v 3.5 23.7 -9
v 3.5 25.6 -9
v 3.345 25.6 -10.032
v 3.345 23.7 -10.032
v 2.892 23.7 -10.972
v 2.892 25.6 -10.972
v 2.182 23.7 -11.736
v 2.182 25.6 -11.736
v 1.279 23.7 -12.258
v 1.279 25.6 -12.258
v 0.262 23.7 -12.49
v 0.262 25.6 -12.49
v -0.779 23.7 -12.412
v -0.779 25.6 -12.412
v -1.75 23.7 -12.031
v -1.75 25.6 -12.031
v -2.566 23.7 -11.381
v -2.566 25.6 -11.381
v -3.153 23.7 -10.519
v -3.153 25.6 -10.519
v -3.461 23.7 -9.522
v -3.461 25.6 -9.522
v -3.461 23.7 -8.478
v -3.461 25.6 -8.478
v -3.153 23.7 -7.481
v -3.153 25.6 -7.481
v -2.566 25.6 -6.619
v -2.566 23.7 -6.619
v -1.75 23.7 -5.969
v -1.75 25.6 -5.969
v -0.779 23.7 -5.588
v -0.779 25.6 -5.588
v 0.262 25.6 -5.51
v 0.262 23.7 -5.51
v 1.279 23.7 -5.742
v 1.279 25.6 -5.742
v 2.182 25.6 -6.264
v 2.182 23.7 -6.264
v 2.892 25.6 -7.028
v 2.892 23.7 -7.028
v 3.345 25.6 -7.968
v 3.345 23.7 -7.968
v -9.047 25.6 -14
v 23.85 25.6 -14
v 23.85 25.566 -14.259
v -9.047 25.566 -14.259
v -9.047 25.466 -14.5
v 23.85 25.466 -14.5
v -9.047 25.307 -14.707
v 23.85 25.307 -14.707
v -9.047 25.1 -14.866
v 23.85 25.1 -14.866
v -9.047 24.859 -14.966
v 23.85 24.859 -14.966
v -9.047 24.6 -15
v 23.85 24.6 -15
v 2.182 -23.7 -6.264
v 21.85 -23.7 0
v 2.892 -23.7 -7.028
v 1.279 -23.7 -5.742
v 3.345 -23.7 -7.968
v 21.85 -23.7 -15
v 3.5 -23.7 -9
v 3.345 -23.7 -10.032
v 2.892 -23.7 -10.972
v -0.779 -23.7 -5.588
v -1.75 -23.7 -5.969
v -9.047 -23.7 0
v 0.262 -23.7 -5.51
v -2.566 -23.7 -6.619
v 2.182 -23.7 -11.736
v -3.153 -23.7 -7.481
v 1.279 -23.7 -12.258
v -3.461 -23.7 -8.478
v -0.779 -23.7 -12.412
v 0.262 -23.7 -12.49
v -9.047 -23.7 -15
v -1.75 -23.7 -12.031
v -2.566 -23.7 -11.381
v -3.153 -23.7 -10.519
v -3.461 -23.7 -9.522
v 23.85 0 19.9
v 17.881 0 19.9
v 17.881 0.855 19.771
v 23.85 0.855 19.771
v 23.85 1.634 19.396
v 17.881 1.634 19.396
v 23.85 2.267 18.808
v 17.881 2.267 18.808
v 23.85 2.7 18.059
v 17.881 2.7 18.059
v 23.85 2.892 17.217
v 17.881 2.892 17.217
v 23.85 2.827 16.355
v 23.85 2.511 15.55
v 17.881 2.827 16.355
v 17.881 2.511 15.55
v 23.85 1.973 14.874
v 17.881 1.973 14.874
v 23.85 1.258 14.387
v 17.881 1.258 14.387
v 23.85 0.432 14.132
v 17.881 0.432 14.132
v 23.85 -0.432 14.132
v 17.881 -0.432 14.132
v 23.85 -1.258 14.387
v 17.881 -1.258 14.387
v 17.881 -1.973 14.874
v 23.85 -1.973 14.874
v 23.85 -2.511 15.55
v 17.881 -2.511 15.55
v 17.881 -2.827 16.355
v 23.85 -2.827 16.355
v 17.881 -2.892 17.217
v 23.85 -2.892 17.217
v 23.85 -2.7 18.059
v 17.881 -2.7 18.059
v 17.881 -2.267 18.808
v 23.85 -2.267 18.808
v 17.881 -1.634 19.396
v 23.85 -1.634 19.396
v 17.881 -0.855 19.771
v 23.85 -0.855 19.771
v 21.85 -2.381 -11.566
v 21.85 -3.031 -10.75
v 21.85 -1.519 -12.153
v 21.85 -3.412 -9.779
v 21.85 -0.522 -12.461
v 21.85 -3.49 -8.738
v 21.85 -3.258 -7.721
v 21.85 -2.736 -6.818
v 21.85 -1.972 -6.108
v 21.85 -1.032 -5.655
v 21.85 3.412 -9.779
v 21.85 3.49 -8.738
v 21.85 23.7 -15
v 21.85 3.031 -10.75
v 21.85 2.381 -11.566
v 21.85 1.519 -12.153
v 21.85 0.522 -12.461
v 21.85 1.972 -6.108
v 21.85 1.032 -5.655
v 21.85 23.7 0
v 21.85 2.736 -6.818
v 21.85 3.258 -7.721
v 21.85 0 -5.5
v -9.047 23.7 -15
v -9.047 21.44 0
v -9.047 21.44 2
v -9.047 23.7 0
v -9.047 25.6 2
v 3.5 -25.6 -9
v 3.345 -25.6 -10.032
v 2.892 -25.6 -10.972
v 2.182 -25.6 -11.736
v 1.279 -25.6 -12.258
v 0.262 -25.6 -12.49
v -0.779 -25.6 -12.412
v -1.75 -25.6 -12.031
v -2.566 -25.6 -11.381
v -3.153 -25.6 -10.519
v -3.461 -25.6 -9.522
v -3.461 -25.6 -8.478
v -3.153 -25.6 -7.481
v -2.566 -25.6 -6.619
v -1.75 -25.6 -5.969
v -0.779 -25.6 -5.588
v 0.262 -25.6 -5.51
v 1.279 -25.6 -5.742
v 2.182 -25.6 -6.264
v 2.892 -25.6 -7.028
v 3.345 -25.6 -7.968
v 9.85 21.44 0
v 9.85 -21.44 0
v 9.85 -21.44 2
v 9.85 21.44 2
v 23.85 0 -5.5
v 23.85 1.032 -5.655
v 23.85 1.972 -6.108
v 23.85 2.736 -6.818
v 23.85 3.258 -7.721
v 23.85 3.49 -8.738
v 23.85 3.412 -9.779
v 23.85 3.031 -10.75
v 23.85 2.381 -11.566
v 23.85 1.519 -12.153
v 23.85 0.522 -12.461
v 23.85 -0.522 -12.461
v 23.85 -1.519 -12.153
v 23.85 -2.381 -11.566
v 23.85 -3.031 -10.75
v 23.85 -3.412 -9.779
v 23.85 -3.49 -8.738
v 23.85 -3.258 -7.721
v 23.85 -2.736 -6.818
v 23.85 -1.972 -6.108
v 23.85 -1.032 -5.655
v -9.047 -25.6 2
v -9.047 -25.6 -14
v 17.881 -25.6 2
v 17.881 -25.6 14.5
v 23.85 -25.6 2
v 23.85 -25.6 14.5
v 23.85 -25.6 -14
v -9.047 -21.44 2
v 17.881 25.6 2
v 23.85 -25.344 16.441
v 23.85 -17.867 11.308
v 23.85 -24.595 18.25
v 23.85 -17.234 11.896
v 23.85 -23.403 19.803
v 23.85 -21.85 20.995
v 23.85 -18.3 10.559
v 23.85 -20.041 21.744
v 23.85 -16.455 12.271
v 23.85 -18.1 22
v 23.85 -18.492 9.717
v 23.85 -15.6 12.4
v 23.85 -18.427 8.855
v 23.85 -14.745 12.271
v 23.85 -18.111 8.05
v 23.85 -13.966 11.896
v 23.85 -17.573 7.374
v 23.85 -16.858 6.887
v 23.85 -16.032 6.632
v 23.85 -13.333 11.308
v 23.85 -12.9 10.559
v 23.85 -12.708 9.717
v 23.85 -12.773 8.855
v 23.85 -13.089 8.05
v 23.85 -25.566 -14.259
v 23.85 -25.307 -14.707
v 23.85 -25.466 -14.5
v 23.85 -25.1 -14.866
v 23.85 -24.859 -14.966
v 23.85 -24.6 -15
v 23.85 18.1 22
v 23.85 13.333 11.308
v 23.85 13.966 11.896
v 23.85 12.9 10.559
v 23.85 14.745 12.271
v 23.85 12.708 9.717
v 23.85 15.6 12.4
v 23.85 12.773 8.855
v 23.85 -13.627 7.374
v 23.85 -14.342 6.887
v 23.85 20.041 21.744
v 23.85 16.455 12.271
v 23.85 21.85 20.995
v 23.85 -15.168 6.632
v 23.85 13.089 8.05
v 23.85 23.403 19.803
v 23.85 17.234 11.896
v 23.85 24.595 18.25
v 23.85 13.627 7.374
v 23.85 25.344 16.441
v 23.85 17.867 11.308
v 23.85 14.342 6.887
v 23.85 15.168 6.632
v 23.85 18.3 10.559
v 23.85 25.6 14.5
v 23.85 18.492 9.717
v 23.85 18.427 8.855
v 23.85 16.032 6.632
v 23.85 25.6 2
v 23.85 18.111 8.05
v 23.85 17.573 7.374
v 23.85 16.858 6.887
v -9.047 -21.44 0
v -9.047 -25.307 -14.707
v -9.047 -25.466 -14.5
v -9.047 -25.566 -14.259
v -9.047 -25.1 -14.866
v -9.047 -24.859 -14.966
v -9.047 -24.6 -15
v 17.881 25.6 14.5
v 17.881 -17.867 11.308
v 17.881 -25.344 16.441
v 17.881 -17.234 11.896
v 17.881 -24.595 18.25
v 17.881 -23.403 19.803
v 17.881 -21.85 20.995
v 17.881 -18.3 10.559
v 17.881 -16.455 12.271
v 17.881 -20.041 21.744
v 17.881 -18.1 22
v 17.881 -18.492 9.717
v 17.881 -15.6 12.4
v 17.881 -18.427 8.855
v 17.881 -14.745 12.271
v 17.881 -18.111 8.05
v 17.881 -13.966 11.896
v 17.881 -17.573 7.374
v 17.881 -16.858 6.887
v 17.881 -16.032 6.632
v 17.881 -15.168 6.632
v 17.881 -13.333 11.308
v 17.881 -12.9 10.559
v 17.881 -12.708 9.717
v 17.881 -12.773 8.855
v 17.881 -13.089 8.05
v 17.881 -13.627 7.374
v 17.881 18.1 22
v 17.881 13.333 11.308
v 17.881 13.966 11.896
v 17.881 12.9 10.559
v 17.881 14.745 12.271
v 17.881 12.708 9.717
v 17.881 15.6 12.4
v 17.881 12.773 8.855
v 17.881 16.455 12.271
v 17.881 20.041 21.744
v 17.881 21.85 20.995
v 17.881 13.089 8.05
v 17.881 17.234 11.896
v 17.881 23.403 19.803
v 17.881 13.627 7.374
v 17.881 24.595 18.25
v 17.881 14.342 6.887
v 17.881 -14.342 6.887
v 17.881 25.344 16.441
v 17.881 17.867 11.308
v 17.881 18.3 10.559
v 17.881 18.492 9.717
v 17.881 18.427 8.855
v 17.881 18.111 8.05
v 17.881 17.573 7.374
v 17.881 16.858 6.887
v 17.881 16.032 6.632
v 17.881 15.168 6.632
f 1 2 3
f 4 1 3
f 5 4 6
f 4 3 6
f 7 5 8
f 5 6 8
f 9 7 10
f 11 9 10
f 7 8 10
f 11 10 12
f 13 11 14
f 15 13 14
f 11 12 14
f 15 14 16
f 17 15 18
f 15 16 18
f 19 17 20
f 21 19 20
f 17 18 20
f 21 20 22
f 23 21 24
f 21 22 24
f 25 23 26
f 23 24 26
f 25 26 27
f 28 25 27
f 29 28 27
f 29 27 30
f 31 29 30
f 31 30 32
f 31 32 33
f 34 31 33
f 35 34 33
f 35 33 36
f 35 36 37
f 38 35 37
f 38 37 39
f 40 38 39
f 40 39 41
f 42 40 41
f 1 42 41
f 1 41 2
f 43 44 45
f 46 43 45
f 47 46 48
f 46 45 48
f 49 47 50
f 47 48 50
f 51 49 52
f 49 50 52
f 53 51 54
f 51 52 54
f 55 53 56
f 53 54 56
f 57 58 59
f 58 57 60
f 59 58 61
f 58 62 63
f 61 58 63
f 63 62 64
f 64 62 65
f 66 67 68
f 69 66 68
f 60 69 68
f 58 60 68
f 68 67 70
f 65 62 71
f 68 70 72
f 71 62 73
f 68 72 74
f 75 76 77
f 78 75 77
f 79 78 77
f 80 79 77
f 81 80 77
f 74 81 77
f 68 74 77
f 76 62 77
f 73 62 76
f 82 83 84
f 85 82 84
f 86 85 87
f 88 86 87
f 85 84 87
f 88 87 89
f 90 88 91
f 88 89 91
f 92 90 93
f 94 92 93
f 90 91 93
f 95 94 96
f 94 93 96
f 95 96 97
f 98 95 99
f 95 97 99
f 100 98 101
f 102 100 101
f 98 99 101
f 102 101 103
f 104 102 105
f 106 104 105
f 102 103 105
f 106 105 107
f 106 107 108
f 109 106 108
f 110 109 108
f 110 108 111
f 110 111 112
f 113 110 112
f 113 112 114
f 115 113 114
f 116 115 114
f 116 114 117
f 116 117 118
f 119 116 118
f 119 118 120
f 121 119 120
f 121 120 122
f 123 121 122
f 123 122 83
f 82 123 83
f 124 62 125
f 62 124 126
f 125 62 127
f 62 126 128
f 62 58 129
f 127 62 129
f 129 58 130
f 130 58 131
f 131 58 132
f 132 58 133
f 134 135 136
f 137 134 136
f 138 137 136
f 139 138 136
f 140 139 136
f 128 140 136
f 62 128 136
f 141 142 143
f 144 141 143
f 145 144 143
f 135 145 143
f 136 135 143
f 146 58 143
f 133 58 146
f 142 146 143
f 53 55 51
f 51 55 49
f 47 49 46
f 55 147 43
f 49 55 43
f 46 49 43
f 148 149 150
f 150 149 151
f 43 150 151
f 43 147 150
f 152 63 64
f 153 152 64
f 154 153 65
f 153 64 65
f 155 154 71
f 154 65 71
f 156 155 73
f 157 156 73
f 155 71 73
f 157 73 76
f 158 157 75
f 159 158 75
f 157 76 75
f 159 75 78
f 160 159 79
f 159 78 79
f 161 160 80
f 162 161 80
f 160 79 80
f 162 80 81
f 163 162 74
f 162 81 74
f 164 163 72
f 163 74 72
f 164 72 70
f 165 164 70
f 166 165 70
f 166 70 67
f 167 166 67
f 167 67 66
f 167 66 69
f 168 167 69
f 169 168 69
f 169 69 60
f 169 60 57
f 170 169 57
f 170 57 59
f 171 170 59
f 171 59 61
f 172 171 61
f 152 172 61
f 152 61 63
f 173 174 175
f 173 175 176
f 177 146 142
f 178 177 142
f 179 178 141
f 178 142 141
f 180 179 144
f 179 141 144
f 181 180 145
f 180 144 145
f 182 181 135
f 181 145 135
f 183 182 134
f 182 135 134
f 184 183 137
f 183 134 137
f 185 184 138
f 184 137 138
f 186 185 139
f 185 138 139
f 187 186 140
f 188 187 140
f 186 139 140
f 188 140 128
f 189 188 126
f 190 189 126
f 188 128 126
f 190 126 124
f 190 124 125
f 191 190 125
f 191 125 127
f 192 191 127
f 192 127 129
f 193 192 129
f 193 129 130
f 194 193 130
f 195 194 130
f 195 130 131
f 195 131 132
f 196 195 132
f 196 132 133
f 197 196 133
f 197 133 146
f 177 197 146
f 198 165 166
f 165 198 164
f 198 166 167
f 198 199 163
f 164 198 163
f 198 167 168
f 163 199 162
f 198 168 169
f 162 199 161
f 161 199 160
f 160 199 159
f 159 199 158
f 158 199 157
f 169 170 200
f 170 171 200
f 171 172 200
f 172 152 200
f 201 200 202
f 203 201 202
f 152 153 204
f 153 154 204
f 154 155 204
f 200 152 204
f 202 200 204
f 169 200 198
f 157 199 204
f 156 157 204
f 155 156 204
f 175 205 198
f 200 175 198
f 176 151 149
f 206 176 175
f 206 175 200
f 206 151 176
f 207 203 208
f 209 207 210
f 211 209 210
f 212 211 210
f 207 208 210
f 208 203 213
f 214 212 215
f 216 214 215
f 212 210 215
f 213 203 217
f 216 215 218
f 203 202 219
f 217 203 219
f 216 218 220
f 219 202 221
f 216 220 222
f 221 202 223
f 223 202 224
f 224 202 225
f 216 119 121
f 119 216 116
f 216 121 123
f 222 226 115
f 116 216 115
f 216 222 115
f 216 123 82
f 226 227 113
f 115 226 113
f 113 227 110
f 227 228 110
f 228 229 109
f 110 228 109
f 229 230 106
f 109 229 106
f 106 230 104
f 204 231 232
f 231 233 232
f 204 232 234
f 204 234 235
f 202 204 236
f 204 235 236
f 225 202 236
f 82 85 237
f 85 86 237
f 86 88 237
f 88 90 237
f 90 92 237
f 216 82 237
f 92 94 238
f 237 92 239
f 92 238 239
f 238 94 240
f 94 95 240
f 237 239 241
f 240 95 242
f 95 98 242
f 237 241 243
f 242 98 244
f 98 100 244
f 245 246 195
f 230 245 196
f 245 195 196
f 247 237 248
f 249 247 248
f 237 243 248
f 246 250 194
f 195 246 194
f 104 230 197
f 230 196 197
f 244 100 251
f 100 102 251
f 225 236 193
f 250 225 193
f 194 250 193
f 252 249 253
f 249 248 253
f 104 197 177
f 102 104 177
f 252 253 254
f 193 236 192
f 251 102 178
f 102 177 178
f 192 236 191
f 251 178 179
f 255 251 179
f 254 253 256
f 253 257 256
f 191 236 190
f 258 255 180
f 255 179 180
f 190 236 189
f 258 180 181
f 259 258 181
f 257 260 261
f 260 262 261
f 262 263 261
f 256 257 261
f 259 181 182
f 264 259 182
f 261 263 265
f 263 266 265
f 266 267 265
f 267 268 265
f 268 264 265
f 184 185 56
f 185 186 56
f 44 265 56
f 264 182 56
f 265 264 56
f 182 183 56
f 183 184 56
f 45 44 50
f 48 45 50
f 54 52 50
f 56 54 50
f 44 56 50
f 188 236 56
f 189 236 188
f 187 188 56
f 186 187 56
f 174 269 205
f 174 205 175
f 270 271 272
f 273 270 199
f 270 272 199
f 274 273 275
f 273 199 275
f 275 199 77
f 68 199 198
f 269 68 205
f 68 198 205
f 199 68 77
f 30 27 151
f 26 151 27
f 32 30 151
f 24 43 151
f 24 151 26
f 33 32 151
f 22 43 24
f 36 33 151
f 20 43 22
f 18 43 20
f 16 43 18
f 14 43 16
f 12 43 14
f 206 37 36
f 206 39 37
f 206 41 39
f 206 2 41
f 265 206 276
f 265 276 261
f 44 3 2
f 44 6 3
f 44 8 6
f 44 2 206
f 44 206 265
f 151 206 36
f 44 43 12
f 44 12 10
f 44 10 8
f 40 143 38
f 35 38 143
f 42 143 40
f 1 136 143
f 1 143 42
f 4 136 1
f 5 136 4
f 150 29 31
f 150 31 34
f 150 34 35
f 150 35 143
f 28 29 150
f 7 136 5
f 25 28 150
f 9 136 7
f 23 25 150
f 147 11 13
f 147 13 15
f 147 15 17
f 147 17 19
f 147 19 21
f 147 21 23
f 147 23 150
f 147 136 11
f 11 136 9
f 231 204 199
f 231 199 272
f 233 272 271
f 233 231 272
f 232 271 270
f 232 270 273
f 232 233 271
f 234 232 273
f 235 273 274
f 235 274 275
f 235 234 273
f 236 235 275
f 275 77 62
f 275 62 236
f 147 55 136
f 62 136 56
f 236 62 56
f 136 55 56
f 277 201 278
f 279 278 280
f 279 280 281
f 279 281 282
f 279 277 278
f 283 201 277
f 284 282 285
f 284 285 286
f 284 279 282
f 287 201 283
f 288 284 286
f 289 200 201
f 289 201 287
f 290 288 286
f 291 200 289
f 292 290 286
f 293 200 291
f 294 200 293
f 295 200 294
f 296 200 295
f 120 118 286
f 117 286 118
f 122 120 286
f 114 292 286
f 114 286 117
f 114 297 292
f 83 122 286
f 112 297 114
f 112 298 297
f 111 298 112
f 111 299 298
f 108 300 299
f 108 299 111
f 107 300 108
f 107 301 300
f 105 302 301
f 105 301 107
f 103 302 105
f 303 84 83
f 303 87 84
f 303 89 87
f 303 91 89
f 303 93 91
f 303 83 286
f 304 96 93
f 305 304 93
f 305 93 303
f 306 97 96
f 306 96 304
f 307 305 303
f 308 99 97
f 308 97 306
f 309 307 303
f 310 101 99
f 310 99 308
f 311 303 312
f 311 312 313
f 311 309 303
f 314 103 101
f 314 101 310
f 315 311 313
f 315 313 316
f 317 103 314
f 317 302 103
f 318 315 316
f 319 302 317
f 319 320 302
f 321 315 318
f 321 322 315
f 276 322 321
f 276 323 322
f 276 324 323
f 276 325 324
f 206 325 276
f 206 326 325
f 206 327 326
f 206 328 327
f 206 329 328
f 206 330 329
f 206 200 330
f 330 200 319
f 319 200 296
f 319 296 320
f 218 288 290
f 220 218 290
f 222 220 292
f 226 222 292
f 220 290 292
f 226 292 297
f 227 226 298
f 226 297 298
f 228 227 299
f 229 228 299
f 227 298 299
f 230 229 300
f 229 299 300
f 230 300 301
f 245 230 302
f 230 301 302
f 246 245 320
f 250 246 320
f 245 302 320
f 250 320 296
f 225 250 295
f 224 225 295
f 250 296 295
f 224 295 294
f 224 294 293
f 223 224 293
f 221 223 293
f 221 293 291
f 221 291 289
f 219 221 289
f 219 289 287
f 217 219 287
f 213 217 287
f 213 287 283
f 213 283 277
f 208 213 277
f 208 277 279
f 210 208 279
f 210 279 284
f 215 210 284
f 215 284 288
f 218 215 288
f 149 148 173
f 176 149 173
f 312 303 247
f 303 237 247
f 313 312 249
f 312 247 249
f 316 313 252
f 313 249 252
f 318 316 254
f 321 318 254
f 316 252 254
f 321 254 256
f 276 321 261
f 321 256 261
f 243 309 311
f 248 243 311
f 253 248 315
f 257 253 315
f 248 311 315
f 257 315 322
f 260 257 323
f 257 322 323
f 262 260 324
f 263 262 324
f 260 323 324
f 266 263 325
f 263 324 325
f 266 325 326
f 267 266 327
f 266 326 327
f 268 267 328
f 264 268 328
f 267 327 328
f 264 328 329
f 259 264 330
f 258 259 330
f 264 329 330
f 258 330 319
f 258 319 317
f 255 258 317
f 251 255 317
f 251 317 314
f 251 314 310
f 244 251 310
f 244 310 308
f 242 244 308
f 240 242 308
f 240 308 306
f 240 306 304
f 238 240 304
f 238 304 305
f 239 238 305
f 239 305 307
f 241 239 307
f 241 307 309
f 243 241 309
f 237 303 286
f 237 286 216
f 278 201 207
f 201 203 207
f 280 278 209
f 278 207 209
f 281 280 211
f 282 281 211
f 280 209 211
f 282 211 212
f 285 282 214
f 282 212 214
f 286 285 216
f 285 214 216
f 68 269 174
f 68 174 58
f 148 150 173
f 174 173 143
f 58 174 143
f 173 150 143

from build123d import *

# Parameters (mm, degrees)
SKETCH2_W            = 43.7
SKETCH2_H            = 47.2
SKETCH2_W_2          = 39.7
SKETCH2_H_2          = 42.879633868
SKETCH2_W_3          = 10
BOSS_EXTRUDE1_DEPTH  = 2
SKETCH3_W            = 47.7
SKETCH3_H            = 51.2
SKETCH3_W_2          = 43.7
SKETCH3_H_2          = 47.2
BOSS_EXTRUDE2_DEPTH  = 17
M6_CLEARANCE_HOLE1_D = 7
M6_CLEARANCE_HOLE2_D = 7
SKETCH9_W            = 5.969043329
SKETCH9_H            = 51.2
BOSS_EXTRUDE3_DEPTH  = 20
M5_CLEARANCE_HOLE1_D = 5.8
FILLET1_R            = 7.5
FILLET2_R            = 1
SKETCH15_W           = 14.80289281
SKETCH15_H           = 51.2
CUT_EXTRUDE1_DEPTH   = 41.301147626
SKETCH19_W           = 35.398634532
SKETCH19_H           = 47.4
CUT_EXTRUDE2_DEPTH   = 15


with BuildPart() as part:
    # Sketch2 → Boss-Extrude1 (new body)
    # profile 1 of 2: a face of its own
    with BuildSketch(Plane.XY):
        Rectangle(SKETCH2_W, SKETCH2_H)
        Rectangle(SKETCH2_W_2, SKETCH2_H_2, mode=Mode.SUBTRACT)
    # profile 2 of 2: a face of its own
    with BuildSketch(Plane.XY):
        with Locations((14.85, 0)):
            Rectangle(SKETCH2_W_3, SKETCH2_H_2)
    extrude(amount=BOSS_EXTRUDE1_DEPTH)

    # Sketch3 → Boss-Extrude2 (add)
    with BuildSketch(Plane.XY.offset(2)):
        Rectangle(SKETCH3_W, SKETCH3_H)
        Rectangle(SKETCH3_W_2, SKETCH3_H_2, mode=Mode.SUBTRACT)
    extrude(amount=-BOSS_EXTRUDE2_DEPTH)

    # M6 Clearance Hole1 (through all)
    with Locations(Plane(origin=(0, -25.6, 0), x_dir=(-1, 0, 0), z_dir=(0, -1, 0))):
        with Locations((0, 9)):
            Hole(M6_CLEARANCE_HOLE1_D / 2)

    # M6 Clearance Hole2 (through all)
    with Locations(Plane(origin=(23.85, 0, 0), x_dir=(0, 0, -1), z_dir=(1, 0, 0))):
        with Locations((9, 0)):
            Hole(M6_CLEARANCE_HOLE2_D / 2)

    # Sketch9 → Boss-Extrude3 (add)
    with BuildSketch(Plane.XY.offset(2)):
        with Locations((20.865478336, 0)):
            Rectangle(SKETCH9_W, SKETCH9_H)
    extrude(amount=BOSS_EXTRUDE3_DEPTH)

    # M5 Clearance Hole1 (through all)
    with Locations(Plane(origin=(23.85, 0, 0), x_dir=(0, 0, -1), z_dir=(1, 0, 0))):
        with Locations((-9.5, -15.6), (-9.5, 15.6), (-17, 0)):
            Hole(M5_CLEARANCE_HOLE1_D / 2)

    # Fillet1
    fillet1_edges = [part.edges().sort_by_distance(p)[0] for p in [
        (20.865478335, 25.6, 22),
        (20.865478335, -25.6, 22),
    ]]
    fillet(fillet1_edges, radius=FILLET1_R)

    # Fillet2
    fillet2_edges = [part.edges().sort_by_distance(p)[0] for p in [
        (0, 25.6, -15),
        (0, -25.6, -15),
    ]]
    fillet(fillet2_edges, radius=FILLET2_R)

    # Sketch15 → Cut-Extrude1 (cut, through all)
    with BuildSketch(Plane.XY.offset(2)):
        with Locations((-16.448553595, 0)):
            Rectangle(SKETCH15_W, SKETCH15_H)
    extrude(amount=-CUT_EXTRUDE1_DEPTH, mode=Mode.SUBTRACT)

    # Sketch19 → Cut-Extrude2 (cut)
    with BuildSketch(Plane(origin=(0, 0, -15), x_dir=(-1, 0, 0), z_dir=(0, 0, -1))):
        with Locations((-4.150682734, 0)):
            Rectangle(SKETCH19_W, SKETCH19_H)
    extrude(amount=-CUT_EXTRUDE2_DEPTH, mode=Mode.SUBTRACT)


solid = part.part
